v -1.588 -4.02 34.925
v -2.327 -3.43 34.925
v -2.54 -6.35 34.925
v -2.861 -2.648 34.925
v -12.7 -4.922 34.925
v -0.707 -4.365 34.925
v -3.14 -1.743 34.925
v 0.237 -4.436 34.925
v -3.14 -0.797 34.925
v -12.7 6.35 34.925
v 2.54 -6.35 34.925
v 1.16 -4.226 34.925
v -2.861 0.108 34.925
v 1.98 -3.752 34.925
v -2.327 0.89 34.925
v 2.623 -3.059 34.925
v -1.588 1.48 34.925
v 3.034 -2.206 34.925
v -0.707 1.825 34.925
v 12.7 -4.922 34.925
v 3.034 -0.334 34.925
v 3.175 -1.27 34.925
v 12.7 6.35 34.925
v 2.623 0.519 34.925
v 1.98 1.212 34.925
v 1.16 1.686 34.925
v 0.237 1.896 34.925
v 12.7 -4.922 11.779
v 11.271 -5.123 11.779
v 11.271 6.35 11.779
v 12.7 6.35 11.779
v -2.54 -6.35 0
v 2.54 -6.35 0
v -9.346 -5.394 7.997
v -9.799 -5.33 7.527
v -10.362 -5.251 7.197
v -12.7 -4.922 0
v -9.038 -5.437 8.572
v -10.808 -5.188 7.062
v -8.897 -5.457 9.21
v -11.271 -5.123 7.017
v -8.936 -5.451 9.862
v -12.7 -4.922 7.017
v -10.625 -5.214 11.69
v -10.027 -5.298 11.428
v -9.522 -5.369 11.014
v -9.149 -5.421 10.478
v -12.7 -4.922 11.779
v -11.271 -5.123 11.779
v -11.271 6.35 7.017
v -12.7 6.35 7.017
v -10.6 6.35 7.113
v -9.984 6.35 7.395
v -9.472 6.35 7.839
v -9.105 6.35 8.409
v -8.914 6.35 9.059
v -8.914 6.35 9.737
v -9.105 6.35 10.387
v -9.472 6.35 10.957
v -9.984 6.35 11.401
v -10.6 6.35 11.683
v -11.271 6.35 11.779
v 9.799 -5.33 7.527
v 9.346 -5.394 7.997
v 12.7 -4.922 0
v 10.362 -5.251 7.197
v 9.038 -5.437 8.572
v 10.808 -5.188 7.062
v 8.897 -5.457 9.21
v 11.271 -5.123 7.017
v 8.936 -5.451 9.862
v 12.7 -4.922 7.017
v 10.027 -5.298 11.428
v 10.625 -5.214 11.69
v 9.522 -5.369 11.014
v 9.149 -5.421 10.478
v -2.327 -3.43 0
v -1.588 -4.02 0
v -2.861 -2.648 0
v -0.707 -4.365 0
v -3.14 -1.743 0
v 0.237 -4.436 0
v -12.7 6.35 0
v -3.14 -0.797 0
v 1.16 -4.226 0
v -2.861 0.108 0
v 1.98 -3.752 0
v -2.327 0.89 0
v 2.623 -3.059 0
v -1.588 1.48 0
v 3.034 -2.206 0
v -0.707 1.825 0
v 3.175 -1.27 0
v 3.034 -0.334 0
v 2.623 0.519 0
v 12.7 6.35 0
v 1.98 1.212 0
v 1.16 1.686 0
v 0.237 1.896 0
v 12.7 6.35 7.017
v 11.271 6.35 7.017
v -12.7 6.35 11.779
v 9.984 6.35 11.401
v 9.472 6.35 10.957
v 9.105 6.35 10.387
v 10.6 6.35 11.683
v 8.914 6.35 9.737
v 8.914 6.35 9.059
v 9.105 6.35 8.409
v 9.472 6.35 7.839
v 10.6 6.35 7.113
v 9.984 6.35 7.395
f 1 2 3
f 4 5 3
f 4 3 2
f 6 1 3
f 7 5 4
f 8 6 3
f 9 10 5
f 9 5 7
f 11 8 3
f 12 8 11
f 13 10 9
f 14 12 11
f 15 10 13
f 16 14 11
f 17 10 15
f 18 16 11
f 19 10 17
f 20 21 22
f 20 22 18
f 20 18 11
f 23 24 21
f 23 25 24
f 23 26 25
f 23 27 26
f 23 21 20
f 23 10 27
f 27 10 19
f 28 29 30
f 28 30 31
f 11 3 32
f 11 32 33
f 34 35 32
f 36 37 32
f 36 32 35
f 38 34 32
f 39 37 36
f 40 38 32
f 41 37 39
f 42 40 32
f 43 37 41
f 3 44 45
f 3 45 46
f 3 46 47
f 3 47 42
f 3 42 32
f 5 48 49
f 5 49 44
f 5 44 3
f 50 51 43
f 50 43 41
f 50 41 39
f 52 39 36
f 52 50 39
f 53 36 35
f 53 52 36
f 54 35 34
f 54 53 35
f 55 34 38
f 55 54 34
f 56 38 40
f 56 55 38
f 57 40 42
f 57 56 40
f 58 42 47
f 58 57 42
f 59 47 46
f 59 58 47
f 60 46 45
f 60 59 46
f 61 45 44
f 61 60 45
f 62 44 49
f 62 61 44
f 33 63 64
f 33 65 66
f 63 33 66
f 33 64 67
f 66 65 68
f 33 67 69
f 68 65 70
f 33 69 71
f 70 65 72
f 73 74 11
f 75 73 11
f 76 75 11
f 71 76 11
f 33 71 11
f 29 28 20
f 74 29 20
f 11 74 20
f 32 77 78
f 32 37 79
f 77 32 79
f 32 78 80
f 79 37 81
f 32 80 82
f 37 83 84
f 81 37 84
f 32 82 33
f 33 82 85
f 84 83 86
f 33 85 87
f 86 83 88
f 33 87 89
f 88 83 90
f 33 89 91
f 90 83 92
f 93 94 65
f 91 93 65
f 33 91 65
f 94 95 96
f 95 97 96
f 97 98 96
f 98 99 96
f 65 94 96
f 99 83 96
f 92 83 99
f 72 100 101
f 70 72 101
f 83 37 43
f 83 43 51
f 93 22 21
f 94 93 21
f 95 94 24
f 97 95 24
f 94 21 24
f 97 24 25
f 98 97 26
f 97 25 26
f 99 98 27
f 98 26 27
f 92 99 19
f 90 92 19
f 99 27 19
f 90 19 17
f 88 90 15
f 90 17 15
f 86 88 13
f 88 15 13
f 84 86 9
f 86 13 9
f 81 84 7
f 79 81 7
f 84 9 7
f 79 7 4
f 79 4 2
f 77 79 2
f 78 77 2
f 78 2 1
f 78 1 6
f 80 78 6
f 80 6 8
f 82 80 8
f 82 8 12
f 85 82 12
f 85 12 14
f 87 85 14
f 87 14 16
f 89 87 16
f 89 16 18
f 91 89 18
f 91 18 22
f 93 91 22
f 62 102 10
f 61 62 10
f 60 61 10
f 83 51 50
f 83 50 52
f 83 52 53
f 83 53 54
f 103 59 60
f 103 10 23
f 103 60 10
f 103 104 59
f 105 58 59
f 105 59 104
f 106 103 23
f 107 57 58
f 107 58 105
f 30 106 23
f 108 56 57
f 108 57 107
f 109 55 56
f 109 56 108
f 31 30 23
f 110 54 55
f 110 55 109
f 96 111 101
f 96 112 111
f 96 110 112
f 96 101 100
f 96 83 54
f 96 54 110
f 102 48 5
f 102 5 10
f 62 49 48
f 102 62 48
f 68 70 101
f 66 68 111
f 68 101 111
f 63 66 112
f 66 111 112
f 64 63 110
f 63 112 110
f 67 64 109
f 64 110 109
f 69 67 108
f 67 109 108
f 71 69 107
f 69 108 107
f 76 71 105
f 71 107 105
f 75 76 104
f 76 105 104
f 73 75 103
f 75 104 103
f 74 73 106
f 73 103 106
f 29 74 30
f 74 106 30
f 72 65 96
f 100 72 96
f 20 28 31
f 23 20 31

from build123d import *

# Parameters (mm, degrees)
SKETCH1_W                   = 25.4
SKETCH1_H                   = 12.7
EXTRUDE1_DEPTH              = 34.925
CHAMFER1_SIZE               = 10.16
CHAMFER1_SIZE2              = 1.427894881
F_1_4_0_25_DIAMETER_HOLE1_D = 6.35
EXTRUDE2_DEPTH              = 13.7


with BuildPart() as part:
    # Sketch1 → Extrude1 (new body)
    with BuildSketch(Plane.XY):
        Rectangle(SKETCH1_W, SKETCH1_H)
    extrude(amount=EXTRUDE1_DEPTH)

    # Chamfer1
    chamfer1_edges = [part.edges().sort_by_distance(p)[0] for p in [
        (12.7, -6.35, 17.4625),
        (-12.7, -6.35, 17.4625),
    ]]
    chamfer1_side = [part.faces().sort_by_distance(p)[0] for p in [
        (0, -6.35, 17.4625),
    ]]
    chamfer(chamfer1_edges, length=CHAMFER1_SIZE, length2=CHAMFER1_SIZE2, reference=chamfer1_side[0])

    # 1/4 (0.25) Diameter Hole1 (through all)
    with Locations(Plane(origin=(0, 0, 0), x_dir=(-1, 0, 0), z_dir=(0, 0, -1))):
        with Locations((0, -1.27)):
            Hole(F_1_4_0_25_DIAMETER_HOLE1_D / 2)

    # Sketch5 → Extrude2 (cut, through all)
    with BuildSketch(Plane(origin=(0, 6.35, 0), x_dir=(1, 0, 0), z_dir=(0, 1, 0))):
        with BuildLine():
            Line((-11.27125, -11.77925), (-12.7, -11.77925))
            Line((-12.7, -11.77925), (-12.7, -7.01675))
            Line((-12.7, -7.01675), (-11.27125, -7.01675))
            ThreePointArc((-11.27125, -7.01675), (-8.89, -9.398), (-11.27125, -11.77925))
        make_face()
    extrude2 = extrude(amount=-EXTRUDE2_DEPTH, mode=Mode.SUBTRACT)

    # Mirror1: Extrude2 across plane
    add(extrude2.mirror(Plane(origin=(0, 0, 0), x_dir=(0, 0, 1), z_dir=(1, 0, 0))), mode=Mode.SUBTRACT)


solid = part.part
